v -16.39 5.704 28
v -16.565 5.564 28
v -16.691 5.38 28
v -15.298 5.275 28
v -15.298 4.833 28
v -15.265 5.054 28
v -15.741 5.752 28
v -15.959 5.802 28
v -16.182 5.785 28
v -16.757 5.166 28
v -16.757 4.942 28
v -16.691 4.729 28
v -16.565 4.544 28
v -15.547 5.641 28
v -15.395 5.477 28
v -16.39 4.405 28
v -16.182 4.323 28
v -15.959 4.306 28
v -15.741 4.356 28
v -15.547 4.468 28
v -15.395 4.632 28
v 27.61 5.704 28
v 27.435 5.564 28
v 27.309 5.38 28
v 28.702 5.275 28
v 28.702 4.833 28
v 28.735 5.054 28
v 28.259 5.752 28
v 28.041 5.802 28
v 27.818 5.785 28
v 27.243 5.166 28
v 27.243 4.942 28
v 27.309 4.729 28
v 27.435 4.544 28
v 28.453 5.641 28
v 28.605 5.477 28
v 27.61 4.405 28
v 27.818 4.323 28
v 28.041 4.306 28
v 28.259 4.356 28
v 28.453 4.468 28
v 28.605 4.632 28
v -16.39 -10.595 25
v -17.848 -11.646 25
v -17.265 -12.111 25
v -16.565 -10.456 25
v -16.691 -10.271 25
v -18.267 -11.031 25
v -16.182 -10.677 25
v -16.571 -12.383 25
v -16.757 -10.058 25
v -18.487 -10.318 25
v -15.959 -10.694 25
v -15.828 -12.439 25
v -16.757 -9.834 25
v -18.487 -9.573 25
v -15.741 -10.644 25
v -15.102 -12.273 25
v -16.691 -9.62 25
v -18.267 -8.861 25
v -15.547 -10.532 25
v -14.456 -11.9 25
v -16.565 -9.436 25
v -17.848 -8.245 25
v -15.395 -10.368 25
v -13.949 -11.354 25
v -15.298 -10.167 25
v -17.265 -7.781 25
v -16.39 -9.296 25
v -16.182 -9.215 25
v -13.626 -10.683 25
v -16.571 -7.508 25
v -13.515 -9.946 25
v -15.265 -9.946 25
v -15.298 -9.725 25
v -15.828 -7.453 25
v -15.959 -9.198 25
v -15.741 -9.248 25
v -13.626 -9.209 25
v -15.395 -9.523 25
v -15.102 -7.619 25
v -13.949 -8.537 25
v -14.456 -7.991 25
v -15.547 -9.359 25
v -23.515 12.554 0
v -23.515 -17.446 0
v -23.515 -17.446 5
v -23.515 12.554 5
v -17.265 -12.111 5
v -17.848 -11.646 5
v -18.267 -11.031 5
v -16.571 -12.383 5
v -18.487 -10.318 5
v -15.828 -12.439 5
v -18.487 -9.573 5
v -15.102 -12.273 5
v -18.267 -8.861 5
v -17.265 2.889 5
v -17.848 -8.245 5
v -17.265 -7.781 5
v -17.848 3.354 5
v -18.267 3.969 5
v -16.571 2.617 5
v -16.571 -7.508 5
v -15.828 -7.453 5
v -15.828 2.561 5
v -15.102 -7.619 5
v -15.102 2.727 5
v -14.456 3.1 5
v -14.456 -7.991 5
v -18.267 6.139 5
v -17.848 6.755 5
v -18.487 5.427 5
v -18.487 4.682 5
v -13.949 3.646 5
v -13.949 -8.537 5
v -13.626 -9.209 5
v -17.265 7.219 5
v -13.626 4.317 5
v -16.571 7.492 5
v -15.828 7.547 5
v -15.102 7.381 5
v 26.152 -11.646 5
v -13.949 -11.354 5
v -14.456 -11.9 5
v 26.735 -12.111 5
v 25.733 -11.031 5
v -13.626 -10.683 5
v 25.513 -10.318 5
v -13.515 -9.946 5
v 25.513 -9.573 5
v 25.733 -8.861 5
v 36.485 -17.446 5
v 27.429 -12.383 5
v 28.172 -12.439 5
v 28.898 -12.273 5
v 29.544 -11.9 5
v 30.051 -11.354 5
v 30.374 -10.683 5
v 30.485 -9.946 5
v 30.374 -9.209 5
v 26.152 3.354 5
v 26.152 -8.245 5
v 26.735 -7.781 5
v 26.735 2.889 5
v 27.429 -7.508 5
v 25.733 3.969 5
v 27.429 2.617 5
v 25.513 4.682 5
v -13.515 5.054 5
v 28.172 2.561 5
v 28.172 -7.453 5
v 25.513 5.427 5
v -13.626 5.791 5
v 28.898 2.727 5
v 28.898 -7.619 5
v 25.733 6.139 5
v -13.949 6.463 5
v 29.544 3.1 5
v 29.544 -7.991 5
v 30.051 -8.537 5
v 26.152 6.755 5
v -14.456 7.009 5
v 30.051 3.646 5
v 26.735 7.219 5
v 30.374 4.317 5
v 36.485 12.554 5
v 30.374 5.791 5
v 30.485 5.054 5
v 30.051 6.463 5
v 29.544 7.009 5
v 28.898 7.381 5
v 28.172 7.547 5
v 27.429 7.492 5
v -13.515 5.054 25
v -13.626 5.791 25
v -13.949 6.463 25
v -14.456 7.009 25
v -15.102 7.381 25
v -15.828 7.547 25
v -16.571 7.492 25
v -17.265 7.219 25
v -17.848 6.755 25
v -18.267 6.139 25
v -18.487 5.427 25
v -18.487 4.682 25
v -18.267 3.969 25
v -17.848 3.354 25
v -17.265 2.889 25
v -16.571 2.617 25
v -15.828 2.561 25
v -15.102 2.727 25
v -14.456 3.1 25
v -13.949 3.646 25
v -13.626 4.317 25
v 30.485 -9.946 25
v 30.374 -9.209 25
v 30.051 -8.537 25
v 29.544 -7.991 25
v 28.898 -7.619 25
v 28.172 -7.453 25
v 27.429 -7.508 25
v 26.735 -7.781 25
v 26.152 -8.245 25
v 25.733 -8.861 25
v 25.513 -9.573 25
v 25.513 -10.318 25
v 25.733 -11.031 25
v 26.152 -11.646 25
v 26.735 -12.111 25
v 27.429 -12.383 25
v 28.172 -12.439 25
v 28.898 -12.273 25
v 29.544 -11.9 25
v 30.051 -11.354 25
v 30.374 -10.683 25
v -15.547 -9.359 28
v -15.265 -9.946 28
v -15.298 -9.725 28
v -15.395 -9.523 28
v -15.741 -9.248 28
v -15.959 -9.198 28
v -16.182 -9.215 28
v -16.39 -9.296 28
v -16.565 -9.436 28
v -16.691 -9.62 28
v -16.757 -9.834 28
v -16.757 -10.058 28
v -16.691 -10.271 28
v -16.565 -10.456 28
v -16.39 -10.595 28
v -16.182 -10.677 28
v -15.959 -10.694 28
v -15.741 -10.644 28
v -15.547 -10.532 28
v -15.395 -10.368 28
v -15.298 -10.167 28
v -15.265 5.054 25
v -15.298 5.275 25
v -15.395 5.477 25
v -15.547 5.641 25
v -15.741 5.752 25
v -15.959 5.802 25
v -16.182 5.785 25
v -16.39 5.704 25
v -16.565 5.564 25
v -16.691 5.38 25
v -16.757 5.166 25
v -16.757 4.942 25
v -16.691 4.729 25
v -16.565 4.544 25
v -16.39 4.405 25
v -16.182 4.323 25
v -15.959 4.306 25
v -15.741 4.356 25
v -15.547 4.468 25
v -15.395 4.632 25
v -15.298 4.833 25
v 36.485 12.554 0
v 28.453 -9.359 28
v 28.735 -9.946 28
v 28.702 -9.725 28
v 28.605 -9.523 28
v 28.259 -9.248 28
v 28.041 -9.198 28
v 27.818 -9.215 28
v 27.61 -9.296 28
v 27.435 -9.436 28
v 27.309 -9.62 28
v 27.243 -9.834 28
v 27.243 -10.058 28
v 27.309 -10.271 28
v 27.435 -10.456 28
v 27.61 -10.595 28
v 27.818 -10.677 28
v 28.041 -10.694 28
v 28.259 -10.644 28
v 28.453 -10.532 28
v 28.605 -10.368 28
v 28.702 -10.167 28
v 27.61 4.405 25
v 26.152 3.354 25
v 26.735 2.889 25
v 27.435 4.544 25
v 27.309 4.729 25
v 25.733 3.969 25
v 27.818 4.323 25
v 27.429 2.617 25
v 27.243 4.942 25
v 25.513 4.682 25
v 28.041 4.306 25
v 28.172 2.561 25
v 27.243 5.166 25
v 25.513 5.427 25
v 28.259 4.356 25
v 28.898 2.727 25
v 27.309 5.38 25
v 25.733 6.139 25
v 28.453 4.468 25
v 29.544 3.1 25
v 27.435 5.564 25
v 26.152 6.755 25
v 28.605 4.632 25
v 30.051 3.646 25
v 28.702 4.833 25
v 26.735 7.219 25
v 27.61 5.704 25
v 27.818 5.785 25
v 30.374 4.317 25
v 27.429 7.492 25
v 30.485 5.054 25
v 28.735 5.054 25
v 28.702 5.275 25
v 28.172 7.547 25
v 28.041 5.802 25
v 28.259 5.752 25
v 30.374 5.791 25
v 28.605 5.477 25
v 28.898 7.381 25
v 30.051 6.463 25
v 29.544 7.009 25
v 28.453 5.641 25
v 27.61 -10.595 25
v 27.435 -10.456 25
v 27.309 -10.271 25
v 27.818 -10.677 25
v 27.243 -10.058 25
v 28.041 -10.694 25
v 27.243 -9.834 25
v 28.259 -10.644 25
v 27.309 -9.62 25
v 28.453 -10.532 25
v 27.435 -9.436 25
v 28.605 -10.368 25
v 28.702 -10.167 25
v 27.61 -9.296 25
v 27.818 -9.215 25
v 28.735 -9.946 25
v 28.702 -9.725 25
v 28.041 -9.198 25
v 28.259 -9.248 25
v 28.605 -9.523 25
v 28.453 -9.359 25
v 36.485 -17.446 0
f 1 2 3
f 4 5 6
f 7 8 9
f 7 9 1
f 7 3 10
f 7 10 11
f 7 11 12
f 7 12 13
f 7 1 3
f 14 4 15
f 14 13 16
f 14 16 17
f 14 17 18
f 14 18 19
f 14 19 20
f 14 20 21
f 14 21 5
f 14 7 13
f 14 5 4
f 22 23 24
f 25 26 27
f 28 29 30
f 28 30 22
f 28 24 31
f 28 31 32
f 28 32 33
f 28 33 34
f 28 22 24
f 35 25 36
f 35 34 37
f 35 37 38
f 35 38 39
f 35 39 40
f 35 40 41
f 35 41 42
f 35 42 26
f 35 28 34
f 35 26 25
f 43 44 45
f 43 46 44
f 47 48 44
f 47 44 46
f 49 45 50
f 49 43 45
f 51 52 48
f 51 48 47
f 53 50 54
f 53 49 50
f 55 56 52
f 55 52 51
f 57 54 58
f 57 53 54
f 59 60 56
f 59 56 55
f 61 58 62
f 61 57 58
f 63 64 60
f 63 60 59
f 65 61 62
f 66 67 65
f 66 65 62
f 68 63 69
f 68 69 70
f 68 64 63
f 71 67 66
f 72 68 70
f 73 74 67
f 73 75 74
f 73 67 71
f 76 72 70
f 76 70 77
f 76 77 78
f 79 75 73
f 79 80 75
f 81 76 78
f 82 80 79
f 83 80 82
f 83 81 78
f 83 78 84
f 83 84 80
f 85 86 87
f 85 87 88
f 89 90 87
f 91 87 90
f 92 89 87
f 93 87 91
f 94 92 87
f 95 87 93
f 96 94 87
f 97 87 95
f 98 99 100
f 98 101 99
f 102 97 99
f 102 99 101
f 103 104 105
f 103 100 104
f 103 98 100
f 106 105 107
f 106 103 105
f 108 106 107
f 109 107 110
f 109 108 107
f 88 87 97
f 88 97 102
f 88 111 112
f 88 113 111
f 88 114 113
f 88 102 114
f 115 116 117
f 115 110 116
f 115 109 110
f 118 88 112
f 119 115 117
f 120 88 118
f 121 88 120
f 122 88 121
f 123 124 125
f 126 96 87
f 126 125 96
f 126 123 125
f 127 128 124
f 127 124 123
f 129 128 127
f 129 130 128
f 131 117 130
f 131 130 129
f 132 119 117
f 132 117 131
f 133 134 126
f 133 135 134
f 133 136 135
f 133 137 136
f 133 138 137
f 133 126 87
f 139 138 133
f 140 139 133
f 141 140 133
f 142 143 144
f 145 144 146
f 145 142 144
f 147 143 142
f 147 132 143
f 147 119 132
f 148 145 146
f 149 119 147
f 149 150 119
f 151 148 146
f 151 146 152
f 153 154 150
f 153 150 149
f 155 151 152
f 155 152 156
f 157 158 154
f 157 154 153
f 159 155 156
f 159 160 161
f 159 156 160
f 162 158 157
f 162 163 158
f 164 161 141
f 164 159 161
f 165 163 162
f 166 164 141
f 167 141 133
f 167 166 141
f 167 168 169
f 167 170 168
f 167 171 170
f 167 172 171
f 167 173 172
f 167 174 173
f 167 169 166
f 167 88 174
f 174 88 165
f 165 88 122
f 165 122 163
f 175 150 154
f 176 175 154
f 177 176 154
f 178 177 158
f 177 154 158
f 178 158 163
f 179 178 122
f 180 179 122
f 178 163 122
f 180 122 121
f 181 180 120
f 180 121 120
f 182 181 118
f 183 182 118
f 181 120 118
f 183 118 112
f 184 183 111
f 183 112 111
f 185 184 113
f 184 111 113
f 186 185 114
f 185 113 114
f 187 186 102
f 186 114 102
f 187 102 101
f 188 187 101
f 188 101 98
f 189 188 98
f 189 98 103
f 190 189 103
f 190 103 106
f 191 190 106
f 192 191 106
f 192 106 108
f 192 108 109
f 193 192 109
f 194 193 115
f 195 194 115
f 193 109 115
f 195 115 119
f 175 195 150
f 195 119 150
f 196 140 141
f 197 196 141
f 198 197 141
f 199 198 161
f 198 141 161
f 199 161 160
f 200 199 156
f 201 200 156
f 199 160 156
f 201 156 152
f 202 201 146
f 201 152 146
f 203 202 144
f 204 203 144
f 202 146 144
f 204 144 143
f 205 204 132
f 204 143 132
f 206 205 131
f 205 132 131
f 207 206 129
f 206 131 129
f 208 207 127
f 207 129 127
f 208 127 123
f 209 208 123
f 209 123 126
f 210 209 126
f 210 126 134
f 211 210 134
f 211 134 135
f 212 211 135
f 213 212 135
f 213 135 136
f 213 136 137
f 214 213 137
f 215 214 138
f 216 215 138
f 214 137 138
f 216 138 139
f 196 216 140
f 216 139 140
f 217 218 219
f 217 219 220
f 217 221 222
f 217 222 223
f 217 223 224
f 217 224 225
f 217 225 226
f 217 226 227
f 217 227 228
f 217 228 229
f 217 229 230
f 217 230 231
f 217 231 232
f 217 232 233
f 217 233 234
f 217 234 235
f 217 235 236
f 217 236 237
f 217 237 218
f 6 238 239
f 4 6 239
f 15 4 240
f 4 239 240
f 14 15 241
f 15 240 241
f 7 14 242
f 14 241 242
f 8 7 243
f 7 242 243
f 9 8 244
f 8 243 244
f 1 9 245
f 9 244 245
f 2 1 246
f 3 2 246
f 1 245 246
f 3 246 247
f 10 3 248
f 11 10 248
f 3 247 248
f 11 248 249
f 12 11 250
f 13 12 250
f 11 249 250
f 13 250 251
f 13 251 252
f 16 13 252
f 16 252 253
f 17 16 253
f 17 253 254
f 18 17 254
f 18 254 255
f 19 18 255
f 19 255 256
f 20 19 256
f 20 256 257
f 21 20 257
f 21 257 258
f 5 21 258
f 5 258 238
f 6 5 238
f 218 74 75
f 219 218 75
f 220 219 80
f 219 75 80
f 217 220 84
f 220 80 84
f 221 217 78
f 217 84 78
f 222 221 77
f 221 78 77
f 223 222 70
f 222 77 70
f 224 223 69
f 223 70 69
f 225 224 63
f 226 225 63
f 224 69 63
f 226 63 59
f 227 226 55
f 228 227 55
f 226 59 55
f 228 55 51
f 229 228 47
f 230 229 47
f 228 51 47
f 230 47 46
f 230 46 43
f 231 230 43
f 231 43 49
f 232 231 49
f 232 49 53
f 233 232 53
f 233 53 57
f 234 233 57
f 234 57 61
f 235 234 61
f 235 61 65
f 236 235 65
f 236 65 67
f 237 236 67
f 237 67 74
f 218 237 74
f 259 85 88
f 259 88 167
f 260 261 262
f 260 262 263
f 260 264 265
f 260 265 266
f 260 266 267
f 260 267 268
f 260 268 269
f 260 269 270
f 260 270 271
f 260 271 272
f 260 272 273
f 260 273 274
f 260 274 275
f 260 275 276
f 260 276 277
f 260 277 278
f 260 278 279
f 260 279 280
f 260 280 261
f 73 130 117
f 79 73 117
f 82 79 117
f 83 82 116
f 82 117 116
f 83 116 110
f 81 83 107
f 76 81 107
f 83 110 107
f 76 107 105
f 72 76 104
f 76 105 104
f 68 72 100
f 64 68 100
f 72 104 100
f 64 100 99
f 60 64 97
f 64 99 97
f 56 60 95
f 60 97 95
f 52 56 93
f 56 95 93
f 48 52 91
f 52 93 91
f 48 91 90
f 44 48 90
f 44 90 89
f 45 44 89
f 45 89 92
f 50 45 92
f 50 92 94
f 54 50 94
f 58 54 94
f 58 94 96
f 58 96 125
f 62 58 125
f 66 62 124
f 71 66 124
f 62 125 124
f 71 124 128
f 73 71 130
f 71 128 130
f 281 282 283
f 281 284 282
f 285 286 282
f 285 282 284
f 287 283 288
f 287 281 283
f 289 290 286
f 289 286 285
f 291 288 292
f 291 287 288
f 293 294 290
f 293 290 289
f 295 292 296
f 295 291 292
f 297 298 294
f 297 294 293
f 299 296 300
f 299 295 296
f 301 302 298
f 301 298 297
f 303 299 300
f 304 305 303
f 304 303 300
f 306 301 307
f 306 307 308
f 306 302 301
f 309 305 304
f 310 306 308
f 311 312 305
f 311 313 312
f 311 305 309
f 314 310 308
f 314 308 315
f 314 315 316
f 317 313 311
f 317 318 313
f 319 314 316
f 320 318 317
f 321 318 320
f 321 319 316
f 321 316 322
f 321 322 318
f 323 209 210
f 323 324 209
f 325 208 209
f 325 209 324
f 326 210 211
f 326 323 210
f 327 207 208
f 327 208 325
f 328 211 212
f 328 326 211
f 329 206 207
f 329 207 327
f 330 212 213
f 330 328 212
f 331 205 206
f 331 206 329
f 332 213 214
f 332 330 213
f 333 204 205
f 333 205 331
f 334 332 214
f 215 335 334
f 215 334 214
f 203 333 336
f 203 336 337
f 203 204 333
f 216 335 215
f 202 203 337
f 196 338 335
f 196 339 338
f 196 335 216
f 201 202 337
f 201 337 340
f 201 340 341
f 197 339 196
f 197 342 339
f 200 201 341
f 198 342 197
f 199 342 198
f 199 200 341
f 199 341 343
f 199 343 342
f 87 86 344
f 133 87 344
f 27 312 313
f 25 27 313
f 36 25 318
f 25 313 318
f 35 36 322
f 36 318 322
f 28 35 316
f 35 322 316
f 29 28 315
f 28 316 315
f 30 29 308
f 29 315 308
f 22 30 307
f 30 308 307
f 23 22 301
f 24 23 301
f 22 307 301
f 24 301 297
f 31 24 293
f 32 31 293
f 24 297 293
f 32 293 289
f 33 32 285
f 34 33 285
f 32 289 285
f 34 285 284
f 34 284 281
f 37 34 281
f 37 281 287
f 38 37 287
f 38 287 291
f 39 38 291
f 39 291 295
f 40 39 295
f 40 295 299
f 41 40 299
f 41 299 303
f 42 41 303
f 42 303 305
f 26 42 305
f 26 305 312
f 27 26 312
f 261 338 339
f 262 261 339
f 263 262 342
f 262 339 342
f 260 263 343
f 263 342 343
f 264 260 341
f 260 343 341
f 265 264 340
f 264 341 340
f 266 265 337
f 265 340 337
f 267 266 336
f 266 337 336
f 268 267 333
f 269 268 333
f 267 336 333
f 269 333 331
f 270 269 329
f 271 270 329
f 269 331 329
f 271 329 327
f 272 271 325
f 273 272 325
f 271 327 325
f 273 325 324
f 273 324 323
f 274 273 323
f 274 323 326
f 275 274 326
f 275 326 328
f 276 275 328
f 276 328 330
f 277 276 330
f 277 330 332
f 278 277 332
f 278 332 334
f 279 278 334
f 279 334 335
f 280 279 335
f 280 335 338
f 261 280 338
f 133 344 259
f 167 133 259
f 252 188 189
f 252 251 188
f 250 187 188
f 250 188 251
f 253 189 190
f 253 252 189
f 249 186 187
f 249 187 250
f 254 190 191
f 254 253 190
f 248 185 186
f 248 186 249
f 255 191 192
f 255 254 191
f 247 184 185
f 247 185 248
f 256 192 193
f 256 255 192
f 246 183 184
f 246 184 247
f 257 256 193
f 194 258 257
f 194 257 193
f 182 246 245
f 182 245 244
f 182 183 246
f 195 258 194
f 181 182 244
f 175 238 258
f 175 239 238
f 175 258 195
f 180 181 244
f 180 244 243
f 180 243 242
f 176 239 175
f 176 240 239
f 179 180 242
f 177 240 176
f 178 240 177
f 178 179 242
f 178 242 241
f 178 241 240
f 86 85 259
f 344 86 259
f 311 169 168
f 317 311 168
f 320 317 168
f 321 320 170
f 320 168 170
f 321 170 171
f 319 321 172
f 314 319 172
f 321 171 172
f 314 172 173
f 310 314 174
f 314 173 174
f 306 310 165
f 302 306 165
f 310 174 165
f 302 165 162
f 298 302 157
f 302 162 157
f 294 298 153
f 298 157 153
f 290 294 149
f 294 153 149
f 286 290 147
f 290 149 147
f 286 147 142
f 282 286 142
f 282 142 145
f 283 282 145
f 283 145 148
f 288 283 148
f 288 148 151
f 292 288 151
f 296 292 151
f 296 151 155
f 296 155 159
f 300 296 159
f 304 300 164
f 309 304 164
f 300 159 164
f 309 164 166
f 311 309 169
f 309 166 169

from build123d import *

# Parameters (mm, degrees)
F0_W     = 60
F0_H     = 30
F1_DEPTH = 5
F2_R     = 2.5
F3_DEPTH = 20
F4_R     = 0.75
F5_DEPTH = 23


with BuildPart() as f1:
    # F0 (on Top) → F1 (new body)
    with BuildSketch(Plane.XY):
        with Locations((6.484929, -2.445796)):
            Rectangle(F0_W, F0_H)
    extrude(amount=F1_DEPTH)

    # F2 (on face) → F3 (join)
    with BuildSketch(Plane.XY.offset(5)):
        with Locations((-16.015071, 5.054204)):
            Circle(F2_R)
        with Locations((-16.015071, -9.945796)):
            Circle(F2_R)
        with Locations((27.984929, 5.054204)):
            Circle(F2_R)
        with Locations((27.984929, -9.945796)):
            Circle(F2_R)
    extrude(amount=F3_DEPTH)

    # F4 (on face) → F5 (join)
    with BuildSketch(Plane.XY.offset(5)):
        with Locations((-16.015071, 5.054204)):
            Circle(F4_R)
        with Locations((-16.015071, -9.945796)):
            Circle(F4_R)
        with Locations((27.984929, 5.054204)):
            Circle(F4_R)
        with Locations((27.984929, -9.945796)):
            Circle(F4_R)
    extrude(amount=F5_DEPTH)


solid = f1.part
